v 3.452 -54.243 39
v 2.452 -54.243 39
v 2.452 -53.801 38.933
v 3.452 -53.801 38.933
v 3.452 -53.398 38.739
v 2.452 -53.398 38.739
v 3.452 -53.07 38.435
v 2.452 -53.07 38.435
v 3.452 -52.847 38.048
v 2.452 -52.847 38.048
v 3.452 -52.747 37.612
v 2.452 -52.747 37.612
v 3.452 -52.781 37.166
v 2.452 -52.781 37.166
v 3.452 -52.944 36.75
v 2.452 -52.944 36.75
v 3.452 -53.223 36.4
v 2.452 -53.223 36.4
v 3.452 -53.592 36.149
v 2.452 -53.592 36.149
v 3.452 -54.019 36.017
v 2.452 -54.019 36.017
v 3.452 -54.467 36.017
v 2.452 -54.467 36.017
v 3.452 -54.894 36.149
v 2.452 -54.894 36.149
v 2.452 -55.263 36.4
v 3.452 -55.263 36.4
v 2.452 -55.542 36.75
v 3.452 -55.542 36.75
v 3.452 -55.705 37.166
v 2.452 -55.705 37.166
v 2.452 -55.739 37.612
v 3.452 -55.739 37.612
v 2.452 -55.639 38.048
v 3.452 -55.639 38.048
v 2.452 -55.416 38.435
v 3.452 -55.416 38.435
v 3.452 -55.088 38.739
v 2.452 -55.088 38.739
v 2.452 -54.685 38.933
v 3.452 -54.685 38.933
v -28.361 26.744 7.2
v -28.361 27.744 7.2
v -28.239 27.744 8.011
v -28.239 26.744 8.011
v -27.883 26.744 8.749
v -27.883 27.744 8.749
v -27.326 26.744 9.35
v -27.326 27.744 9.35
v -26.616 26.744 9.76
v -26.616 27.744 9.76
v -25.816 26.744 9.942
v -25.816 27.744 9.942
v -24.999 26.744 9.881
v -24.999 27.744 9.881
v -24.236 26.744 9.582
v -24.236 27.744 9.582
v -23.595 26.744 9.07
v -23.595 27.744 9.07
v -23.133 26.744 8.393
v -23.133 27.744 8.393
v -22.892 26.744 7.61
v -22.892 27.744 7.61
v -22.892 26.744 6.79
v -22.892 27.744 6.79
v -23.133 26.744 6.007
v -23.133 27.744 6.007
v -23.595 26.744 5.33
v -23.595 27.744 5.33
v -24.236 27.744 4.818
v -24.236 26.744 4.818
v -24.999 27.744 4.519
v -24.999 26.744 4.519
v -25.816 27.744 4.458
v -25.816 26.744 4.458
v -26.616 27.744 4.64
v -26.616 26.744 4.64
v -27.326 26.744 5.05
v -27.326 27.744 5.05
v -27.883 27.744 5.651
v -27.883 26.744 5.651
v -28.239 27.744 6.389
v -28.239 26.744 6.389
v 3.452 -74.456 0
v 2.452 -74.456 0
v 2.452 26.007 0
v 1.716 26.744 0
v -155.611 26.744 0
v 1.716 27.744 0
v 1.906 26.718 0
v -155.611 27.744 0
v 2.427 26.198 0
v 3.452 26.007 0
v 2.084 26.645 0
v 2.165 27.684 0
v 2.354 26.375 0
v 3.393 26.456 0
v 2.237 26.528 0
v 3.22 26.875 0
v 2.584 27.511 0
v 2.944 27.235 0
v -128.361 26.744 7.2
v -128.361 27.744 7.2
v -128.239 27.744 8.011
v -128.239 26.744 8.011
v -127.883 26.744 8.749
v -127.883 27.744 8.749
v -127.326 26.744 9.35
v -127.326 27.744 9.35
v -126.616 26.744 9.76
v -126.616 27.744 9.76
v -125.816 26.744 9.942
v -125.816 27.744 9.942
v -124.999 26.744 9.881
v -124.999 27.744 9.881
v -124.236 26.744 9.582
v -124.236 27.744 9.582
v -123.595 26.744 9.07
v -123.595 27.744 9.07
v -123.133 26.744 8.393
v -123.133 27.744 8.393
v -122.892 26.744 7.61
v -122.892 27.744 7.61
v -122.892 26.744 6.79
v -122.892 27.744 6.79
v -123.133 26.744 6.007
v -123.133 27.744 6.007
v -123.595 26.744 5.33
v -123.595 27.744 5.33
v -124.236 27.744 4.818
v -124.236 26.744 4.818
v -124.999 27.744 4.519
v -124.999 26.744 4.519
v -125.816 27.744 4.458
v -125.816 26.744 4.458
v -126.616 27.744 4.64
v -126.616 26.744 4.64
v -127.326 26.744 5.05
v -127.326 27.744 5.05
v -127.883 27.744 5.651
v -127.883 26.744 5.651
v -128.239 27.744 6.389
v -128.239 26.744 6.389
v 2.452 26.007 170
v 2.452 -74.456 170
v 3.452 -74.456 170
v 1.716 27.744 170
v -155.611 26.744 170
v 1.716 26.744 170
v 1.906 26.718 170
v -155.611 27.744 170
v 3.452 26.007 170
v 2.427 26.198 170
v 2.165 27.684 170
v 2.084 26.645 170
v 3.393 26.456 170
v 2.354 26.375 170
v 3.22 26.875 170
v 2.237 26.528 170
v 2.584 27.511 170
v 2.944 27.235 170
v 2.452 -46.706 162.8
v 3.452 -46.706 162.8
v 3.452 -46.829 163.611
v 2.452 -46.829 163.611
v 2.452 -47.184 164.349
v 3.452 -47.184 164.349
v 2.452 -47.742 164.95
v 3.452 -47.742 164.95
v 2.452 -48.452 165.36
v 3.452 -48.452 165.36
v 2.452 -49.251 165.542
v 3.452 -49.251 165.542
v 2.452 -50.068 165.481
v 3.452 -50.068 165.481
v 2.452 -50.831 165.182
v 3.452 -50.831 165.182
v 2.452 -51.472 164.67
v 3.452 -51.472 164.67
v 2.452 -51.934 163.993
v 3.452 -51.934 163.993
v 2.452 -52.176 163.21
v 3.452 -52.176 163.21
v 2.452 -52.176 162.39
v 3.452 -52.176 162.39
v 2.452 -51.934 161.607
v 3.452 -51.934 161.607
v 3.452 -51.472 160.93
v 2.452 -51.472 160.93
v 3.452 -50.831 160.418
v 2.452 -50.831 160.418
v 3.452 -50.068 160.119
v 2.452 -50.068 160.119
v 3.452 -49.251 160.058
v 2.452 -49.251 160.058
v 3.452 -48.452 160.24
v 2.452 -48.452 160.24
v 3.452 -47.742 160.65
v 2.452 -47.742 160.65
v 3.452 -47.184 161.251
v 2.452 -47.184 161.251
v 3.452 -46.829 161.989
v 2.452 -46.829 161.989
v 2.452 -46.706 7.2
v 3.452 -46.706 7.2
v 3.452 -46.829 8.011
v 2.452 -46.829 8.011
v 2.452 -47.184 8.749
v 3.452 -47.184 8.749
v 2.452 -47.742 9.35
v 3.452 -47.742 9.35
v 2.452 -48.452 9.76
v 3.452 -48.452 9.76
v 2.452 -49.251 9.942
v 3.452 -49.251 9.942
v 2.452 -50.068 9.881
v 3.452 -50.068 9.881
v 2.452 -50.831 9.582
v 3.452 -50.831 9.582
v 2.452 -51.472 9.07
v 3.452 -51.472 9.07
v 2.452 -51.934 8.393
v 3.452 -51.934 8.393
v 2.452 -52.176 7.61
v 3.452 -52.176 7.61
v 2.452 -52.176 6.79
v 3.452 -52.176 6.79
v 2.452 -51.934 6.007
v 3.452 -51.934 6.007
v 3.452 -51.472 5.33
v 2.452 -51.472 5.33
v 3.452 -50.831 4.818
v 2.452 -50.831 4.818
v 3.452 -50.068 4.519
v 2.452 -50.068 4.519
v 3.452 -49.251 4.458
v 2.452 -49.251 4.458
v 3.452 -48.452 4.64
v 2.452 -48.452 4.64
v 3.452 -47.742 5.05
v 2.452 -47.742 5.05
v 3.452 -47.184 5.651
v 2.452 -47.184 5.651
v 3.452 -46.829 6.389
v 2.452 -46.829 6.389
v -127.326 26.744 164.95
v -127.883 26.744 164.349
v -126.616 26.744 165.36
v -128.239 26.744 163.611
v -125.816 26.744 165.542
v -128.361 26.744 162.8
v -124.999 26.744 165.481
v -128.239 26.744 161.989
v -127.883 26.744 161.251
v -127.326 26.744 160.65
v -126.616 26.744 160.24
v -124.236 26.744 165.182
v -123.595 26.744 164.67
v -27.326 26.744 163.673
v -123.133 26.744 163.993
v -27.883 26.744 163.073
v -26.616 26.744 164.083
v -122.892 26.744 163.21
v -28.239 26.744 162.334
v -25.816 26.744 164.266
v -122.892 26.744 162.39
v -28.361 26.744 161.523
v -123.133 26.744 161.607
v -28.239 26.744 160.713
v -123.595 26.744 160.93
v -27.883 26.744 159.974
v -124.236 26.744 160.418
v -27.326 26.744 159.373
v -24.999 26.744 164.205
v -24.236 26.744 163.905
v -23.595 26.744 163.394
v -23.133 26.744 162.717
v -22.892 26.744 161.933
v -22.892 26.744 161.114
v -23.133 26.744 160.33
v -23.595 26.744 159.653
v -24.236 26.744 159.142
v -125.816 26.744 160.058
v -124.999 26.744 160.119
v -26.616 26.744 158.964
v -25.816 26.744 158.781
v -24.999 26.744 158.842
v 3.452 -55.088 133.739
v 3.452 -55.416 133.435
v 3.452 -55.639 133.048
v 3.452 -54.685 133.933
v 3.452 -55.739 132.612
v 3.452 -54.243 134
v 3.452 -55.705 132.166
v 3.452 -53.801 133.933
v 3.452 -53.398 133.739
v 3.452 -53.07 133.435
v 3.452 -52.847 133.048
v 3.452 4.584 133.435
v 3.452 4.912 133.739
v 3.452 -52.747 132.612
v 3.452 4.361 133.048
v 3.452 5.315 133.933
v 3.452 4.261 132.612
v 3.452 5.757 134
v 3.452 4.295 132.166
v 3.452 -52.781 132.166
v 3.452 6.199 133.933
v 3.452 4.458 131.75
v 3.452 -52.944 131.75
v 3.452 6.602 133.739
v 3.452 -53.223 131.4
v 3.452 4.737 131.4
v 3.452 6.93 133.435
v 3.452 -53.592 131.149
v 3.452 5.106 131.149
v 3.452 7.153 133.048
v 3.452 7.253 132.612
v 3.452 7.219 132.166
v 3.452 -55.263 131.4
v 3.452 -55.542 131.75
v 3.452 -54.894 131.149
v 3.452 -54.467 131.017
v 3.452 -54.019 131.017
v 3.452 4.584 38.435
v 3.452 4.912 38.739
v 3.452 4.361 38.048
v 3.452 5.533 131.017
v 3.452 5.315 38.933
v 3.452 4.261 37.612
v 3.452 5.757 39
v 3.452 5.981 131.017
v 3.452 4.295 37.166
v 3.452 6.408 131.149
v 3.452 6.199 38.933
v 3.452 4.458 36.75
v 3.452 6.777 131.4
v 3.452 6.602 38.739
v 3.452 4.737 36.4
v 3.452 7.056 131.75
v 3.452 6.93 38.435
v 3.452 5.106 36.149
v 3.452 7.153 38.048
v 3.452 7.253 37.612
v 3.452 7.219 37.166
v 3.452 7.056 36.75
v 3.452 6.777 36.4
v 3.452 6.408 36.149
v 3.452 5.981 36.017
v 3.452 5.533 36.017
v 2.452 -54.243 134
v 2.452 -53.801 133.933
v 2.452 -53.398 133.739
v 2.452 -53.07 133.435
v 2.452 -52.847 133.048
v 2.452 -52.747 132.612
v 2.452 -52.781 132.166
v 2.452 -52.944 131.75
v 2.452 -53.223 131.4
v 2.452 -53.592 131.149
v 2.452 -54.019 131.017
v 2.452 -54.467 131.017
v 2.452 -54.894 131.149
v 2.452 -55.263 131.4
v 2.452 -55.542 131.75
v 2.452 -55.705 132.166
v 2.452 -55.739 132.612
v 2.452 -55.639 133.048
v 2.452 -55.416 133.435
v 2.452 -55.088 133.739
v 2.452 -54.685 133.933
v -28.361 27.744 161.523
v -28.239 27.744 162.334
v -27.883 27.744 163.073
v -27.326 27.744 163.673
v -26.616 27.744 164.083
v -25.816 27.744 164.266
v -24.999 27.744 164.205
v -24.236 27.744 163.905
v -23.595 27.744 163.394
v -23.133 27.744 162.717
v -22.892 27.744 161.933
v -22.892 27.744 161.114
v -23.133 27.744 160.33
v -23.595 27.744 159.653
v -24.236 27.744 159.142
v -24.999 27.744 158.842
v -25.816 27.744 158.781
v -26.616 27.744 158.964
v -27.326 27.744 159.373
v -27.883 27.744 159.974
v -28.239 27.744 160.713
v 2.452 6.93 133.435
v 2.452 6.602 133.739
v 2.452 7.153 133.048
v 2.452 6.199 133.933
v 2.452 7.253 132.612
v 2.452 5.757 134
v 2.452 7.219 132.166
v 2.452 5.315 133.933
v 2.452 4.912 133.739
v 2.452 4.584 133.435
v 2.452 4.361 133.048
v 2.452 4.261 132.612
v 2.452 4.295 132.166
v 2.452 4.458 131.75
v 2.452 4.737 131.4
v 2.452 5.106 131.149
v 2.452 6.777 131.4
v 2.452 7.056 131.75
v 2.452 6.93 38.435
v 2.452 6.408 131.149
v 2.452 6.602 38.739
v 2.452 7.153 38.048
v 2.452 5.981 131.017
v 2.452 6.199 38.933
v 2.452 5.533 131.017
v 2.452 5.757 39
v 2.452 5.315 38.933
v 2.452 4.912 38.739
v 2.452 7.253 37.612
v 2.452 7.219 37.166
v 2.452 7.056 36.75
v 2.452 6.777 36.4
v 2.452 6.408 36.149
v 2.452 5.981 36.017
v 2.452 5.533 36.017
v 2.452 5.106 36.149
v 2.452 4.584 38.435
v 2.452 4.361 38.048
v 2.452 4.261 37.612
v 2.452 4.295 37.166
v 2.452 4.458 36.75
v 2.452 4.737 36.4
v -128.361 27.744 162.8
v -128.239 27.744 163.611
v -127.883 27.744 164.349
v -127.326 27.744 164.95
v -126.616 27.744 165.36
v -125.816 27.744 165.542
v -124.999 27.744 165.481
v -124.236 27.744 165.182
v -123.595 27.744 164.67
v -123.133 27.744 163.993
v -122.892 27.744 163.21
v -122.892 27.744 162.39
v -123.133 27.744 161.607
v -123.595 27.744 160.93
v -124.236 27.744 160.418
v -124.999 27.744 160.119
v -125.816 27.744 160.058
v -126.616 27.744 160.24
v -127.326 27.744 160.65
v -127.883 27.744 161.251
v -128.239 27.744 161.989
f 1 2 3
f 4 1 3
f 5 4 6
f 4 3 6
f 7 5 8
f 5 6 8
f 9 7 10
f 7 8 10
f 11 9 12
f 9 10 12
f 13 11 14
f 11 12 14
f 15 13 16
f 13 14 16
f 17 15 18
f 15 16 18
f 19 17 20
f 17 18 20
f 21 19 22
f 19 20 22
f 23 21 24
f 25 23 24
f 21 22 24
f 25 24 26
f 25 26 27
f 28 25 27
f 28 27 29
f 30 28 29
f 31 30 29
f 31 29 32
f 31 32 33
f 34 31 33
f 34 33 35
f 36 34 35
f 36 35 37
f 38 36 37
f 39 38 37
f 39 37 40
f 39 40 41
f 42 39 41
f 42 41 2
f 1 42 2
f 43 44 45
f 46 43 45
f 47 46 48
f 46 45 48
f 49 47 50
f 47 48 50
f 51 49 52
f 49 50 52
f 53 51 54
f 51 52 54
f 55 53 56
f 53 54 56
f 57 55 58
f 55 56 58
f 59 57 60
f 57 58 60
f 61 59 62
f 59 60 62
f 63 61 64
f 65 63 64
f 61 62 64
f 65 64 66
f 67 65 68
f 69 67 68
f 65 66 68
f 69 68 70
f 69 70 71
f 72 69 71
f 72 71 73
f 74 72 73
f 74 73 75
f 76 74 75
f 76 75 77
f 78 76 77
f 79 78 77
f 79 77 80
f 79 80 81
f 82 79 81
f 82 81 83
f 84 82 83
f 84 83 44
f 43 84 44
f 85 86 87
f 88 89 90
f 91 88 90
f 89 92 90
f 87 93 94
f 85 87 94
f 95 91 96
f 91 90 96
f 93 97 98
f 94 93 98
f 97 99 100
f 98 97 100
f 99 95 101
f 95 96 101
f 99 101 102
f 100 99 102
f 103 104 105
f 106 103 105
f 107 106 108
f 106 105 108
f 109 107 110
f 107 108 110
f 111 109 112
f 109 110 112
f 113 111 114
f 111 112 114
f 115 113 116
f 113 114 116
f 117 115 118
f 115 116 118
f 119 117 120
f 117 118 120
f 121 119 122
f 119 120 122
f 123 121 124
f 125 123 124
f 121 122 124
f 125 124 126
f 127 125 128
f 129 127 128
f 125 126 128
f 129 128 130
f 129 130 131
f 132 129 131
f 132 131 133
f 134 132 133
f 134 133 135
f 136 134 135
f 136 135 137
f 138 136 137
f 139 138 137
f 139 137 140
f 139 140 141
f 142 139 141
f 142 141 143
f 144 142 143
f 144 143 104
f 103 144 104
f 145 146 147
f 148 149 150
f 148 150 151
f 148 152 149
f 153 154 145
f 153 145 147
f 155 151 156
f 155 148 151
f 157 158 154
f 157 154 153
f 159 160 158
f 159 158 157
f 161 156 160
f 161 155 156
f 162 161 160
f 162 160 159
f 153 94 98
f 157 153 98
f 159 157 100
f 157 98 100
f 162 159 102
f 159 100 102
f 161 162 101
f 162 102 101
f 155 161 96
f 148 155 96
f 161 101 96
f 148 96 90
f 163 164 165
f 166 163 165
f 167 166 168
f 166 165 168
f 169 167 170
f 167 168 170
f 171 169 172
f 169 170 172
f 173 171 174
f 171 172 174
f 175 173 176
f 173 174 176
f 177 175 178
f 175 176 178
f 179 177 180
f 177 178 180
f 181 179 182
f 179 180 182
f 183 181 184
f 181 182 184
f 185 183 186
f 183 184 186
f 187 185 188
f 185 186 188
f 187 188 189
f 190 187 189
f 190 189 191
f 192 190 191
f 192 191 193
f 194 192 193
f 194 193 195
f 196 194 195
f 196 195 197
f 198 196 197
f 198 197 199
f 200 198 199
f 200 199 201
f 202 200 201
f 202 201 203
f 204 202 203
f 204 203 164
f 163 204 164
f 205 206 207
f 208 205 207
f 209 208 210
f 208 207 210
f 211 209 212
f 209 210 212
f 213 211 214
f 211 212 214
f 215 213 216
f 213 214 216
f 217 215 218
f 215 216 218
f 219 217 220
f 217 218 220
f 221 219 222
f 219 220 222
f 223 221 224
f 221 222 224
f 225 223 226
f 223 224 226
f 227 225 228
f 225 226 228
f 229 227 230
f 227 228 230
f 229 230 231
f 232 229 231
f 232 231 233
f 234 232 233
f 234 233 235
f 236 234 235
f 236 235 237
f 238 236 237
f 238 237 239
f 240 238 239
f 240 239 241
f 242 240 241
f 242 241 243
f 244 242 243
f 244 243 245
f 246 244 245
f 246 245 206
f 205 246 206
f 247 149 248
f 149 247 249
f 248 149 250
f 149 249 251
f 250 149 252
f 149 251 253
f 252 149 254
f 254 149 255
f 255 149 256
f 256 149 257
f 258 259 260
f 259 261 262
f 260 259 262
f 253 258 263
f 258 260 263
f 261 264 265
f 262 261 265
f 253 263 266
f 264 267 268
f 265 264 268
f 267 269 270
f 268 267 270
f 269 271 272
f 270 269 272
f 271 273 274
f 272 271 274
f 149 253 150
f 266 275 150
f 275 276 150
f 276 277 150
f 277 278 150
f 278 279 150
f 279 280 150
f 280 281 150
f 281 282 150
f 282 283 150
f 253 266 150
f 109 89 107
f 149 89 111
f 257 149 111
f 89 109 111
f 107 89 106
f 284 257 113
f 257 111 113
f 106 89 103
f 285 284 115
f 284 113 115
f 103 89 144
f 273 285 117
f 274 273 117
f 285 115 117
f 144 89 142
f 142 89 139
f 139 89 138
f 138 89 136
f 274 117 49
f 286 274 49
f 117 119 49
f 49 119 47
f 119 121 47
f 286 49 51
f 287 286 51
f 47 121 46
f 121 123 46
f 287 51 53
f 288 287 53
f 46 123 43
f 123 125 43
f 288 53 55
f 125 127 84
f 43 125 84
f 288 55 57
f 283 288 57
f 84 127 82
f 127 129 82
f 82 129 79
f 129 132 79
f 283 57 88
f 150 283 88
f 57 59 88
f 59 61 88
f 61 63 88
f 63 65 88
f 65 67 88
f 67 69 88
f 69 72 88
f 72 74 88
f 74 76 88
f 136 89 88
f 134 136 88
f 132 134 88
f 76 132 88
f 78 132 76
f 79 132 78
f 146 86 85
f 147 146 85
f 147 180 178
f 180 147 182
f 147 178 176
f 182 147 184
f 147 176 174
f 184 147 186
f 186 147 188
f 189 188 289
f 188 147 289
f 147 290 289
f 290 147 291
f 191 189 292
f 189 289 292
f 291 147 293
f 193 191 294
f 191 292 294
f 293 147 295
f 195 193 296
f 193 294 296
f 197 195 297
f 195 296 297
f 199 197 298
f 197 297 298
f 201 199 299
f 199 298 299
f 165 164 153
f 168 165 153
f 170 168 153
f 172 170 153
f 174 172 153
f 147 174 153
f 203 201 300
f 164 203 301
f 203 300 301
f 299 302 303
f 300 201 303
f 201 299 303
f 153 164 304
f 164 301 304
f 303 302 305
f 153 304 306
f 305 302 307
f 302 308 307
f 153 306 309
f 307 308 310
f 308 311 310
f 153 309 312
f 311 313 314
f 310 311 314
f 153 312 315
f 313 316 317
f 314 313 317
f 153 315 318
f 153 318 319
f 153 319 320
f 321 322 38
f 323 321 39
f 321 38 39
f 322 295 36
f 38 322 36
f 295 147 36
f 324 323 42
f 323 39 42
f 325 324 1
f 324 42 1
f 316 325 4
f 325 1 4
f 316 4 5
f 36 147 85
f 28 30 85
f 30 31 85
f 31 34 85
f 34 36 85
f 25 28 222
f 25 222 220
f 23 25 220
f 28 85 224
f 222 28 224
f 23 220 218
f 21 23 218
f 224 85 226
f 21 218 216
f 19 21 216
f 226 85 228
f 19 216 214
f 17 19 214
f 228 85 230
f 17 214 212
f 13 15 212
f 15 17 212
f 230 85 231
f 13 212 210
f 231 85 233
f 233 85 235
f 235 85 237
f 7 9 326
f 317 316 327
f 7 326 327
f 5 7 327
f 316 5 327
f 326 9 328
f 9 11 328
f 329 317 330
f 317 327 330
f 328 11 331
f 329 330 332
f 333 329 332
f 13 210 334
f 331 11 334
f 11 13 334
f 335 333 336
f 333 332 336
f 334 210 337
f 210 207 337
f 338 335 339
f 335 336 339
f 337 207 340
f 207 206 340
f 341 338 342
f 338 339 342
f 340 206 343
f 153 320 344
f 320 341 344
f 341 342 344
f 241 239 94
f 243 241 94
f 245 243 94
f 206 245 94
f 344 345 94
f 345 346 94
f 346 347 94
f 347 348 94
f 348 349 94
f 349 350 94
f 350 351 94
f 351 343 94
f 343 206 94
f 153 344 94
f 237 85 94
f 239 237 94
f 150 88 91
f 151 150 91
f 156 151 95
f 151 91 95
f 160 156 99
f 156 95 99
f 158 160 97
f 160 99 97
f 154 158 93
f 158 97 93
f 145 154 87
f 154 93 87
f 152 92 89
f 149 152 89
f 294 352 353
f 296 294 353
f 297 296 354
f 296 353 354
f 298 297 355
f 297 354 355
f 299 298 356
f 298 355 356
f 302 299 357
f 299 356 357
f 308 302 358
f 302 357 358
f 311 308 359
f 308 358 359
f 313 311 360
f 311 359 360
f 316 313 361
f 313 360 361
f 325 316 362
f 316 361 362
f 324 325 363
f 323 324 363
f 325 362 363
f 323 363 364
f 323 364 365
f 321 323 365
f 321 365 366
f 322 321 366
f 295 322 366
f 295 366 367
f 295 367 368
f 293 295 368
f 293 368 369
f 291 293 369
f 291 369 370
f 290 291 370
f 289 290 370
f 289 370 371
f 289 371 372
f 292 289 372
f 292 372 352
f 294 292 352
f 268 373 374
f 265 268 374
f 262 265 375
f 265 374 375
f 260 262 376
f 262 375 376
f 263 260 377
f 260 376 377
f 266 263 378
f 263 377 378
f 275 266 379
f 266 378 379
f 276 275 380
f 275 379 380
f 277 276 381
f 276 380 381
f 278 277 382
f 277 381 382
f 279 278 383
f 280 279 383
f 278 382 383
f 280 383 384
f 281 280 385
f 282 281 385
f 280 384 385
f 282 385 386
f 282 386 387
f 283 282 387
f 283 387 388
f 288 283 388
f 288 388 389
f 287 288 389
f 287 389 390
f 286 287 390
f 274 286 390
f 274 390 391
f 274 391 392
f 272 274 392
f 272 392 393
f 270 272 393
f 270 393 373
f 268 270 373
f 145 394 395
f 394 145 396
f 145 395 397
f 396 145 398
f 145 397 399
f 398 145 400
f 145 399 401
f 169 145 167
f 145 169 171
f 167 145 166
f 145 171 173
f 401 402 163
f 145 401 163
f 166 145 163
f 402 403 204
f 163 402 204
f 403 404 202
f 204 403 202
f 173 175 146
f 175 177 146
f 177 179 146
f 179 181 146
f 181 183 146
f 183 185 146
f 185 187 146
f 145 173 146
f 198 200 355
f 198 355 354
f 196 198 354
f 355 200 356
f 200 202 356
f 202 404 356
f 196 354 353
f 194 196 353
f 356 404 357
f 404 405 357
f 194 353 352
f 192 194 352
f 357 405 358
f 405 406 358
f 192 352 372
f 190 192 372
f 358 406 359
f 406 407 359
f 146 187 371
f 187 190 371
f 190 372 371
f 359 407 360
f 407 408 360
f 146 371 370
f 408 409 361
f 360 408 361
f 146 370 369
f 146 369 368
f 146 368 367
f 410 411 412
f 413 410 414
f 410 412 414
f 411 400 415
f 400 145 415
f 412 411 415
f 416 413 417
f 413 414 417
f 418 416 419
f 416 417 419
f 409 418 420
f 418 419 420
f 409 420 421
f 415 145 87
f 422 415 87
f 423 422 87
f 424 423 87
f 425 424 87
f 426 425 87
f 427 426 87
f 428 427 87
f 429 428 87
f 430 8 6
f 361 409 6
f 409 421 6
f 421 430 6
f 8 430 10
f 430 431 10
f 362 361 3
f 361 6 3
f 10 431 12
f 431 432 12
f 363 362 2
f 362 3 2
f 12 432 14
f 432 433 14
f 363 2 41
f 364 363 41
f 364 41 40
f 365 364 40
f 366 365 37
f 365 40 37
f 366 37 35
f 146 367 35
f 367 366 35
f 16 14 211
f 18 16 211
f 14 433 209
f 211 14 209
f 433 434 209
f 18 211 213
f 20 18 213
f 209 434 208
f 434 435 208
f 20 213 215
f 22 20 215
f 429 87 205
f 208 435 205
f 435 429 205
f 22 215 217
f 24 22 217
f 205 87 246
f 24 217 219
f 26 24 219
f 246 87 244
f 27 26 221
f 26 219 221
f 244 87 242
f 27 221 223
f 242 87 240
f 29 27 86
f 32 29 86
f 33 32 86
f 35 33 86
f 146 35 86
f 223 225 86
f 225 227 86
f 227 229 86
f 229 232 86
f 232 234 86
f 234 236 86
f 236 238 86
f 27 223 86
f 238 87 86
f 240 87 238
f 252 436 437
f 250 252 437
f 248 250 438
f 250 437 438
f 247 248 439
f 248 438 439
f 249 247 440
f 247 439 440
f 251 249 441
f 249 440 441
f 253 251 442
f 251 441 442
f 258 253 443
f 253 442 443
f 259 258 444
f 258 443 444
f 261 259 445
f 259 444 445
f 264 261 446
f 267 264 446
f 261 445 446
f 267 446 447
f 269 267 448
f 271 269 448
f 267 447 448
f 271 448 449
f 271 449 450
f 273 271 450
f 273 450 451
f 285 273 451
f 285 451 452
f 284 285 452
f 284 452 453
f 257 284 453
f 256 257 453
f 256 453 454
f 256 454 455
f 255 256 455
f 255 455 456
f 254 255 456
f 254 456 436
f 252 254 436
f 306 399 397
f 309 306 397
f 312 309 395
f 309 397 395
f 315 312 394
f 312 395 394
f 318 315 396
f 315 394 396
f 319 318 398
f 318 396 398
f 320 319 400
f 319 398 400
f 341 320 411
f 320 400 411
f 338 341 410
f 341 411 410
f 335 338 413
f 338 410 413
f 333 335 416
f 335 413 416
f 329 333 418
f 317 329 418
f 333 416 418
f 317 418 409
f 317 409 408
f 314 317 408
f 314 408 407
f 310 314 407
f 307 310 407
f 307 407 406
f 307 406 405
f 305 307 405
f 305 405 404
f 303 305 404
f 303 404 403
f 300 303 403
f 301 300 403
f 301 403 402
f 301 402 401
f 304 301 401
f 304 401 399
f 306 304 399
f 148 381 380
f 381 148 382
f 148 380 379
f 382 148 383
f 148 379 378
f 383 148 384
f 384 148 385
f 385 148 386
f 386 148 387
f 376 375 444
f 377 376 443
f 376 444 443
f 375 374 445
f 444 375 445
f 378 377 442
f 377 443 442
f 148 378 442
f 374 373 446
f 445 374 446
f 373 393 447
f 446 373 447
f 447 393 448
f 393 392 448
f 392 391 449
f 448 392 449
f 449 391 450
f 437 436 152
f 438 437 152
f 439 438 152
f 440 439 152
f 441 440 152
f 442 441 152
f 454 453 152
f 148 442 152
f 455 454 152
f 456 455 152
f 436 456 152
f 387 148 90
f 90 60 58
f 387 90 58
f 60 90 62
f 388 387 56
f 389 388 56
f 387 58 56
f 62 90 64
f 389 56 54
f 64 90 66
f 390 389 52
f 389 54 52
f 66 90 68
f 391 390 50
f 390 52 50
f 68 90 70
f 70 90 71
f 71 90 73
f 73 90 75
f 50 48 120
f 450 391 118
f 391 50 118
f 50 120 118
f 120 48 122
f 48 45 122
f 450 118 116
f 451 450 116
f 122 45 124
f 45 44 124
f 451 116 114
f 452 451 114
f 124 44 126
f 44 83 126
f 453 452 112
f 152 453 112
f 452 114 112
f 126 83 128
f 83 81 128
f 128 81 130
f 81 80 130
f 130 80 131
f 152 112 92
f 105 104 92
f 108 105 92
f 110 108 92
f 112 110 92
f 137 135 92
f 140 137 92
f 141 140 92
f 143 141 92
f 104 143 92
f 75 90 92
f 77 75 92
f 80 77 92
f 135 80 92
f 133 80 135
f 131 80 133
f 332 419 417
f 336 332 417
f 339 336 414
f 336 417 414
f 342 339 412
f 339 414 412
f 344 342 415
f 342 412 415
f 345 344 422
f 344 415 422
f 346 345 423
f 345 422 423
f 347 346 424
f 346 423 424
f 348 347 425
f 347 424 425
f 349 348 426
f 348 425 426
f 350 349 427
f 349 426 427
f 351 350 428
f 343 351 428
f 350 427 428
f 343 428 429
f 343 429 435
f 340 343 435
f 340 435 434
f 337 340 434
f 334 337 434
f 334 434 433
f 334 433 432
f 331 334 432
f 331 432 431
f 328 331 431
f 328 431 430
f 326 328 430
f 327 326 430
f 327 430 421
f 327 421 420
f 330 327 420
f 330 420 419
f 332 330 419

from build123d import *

# Parameters (mm, degrees)
SM_BASE_FLANGE_1_DEPTH = 170
SKETCH_6_R             = 2.75
CUT_EXTRUDE_1_DEPTH    = 10
SKETCH_8_R             = 2.75
CUT_EXTRUDE_2_DEPTH    = 10
HOLE_WIZARD_3_0_3_1_D  = 3


# Sheet-metal steps are written as plain solids
with BuildPart() as part:
    # Sketch 1 → 基体-法兰1 (new body)
    with BuildSketch(Plane.XY):
        with BuildLine():
            Line((-155.610979595, 26.743544458), (1.715820405, 26.743544458))
            ThreePointArc((1.715820405, 26.743544458), (2.23667526, 26.527799313), (2.452420405, 26.006944458))
            Line((2.452420405, 26.006944458), (2.452420405, -74.456455542))
            Line((2.452420405, -74.456455542), (3.452420405, -74.456455542))
            Line((3.452420405, -74.456455542), (3.452420405, 26.006944458))
            ThreePointArc((3.452420405, 26.006944458), (2.943782042, 27.234906094), (1.715820405, 27.743544458))
            Line((1.715820405, 27.743544458), (-155.610979595, 27.743544458))
            Line((-155.610979595, 27.743544458), (-155.610979595, 26.743544458))
        make_face()
    extrude(amount=SM_BASE_FLANGE_1_DEPTH)

    # 草图6 → 切除-拉伸1 (cut)
    with BuildSketch(Plane(origin=(0, 27.743544458, 0), x_dir=(-1, 0, 0), z_dir=(0, 1, 0))):
        with Locations((125.610979595, 162.8)):
            Circle(SKETCH_6_R)
        with Locations((25.610979595, 161.523456844)):
            Circle(SKETCH_6_R)
        with Locations((25.610979595, 7.2)):
            Circle(SKETCH_6_R)
        with Locations((125.610979595, 7.2)):
            Circle(SKETCH_6_R)
    extrude(amount=-CUT_EXTRUDE_1_DEPTH, mode=Mode.SUBTRACT)

    # 草图8 → 切除-拉伸2 (cut)
    with BuildSketch(Plane(origin=(3.452420405, 0, 0), x_dir=(0, 0, -1), z_dir=(1, 0, 0))):
        with Locations(Location((-162.8, -49.456455542, 0), (0, 0, 90))):
            Circle(SKETCH_8_R)
        with Locations(Location((-7.2, -49.456455542, 0), (0, 0, 90))):
            Circle(SKETCH_8_R)
    extrude(amount=-CUT_EXTRUDE_2_DEPTH, mode=Mode.SUBTRACT)

    # Ø3.0 (3) 直径孔1 (through all)
    with Locations(Plane(origin=(3.452420405, 0, 0), x_dir=(0, 0, -1), z_dir=(1, 0, 0))):
        with Locations((-132.5, 5.757044458), (-37.5, 5.757044458), (-37.5, -54.242955542), (-132.5, -54.242955542)):
            Hole(HOLE_WIZARD_3_0_3_1_D / 2)


solid = part.part
